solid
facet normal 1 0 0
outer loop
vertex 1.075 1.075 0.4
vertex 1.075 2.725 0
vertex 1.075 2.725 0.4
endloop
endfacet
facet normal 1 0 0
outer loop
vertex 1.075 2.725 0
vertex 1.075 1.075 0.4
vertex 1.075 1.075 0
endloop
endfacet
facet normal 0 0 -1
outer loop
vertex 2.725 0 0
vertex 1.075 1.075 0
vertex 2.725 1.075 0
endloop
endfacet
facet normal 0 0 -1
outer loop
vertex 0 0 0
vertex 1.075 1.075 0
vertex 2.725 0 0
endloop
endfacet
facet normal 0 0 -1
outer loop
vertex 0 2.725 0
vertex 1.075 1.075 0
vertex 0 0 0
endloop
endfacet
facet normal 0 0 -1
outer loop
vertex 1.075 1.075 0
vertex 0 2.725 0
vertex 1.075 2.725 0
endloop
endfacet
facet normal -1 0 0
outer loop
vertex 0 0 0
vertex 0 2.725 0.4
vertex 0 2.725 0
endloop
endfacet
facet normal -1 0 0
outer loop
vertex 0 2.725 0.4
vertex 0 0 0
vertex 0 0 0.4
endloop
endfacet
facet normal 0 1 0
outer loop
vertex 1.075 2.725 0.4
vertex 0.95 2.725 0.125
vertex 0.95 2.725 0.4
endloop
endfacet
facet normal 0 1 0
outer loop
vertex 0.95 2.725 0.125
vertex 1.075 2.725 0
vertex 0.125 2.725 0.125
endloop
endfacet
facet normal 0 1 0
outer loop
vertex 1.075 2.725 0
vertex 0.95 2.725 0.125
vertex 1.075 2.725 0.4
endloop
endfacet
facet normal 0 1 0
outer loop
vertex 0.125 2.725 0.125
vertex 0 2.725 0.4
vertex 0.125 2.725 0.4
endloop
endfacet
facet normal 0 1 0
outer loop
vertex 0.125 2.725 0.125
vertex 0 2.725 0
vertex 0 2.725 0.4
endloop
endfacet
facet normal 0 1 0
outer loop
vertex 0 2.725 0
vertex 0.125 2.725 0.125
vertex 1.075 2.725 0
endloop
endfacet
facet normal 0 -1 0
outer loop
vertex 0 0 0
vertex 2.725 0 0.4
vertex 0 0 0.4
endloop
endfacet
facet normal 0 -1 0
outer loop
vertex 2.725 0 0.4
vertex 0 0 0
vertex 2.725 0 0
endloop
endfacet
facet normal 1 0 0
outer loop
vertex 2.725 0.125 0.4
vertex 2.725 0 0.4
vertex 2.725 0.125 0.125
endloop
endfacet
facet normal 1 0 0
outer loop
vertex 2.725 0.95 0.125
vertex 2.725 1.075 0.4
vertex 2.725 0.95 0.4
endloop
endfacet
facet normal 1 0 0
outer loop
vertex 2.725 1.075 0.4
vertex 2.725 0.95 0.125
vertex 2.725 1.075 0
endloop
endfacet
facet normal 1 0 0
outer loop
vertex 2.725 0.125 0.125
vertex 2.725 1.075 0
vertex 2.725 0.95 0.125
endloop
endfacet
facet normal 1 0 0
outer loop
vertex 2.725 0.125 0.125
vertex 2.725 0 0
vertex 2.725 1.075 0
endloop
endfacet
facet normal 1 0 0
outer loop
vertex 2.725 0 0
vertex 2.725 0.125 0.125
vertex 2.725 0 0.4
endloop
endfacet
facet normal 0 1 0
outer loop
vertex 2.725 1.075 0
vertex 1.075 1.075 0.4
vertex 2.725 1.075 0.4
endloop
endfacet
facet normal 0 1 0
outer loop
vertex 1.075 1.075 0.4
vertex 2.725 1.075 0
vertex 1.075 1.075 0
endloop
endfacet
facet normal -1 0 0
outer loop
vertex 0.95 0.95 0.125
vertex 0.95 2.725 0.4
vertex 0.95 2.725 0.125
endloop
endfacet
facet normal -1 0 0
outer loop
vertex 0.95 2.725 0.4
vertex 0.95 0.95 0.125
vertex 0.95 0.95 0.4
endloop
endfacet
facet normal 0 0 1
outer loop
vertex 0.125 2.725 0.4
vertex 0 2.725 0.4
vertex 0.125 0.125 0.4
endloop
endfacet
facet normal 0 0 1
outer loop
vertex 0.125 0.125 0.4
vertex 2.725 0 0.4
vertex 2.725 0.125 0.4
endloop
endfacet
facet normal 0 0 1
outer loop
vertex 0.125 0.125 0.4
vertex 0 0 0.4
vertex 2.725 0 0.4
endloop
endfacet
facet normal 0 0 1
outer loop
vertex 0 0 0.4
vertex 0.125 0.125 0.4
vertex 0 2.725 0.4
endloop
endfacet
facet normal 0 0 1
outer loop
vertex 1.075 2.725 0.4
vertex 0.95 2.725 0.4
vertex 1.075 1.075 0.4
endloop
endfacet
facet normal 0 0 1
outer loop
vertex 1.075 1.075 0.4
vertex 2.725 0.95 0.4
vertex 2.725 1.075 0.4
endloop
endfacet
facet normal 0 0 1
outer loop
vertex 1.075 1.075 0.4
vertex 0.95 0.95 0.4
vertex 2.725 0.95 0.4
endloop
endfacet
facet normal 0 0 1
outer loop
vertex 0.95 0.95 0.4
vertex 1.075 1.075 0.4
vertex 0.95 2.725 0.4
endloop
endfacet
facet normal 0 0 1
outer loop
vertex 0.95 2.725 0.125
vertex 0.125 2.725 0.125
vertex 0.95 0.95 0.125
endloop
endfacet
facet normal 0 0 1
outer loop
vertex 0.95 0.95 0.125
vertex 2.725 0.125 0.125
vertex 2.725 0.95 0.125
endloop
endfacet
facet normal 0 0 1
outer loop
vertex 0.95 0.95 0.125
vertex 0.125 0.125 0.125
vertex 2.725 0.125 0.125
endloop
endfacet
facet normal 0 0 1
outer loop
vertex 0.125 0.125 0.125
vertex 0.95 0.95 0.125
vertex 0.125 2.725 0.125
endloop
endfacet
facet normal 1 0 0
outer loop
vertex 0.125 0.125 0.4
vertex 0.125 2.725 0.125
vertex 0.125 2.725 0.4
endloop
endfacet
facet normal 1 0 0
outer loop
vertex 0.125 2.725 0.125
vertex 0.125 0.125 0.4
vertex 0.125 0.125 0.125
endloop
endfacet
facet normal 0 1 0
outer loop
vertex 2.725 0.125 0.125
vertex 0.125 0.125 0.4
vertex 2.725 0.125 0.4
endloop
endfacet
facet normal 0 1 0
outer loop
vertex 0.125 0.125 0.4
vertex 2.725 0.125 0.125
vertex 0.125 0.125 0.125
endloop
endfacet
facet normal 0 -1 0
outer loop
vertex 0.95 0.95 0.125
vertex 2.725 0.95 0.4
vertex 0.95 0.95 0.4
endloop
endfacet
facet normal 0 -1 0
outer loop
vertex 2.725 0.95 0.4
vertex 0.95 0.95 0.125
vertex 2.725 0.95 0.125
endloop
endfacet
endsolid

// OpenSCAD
// Window screen corners

tolerance = 1.10;
frameWidth = 0.75 * tolerance;
frameDepth = 0.25 * tolerance;
thickness = 0.125;
//multiplier = 25.4;
multiplier = 1;
TWO_SIDED = false;
DRILL_HOLE = false;


ScreenCorner(
    frameWidth * multiplier,
    frameDepth * multiplier,
    thickness * multiplier,
    frameWidth * multiplier * 3
);

module ScreenCorner(frameWidth=3, frameDepth=1, thickness=1, socketLength=9, $fn=false) {
    center = $fn;

    totalDepth = 2 * thickness + frameDepth;
    totalWidth = 2 * thickness + frameWidth;
    totalHeight = 2 * thickness + socketLength;
    radius = thickness * 3;
    holeOffset = frameDepth * 2;

    difference() {
        union() {
            cube([totalWidth, totalHeight, totalDepth], center);
            cube([totalHeight, totalWidth, totalDepth], center);
        }
     
        translate([thickness, thickness, thickness]) {
            cube([frameWidth, totalHeight, frameDepth], center);    
        }
        translate([thickness, thickness, thickness]) {
            cube([totalHeight, frameWidth, frameDepth], center);
        }
        translate([
            TWO_SIDED ? thickness : 0,
            TWO_SIDED ? thickness : 0,
            TWO_SIDED ? totalDepth - 2*thickness : totalDepth - thickness
        ]) {
            cube([
                totalHeight,
                totalHeight,
                TWO_SIDED ? thickness : thickness * 2
            ], center); 
        }
        if (DRILL_HOLE) {
            translate([holeOffset, holeOffset, 0]) {
                cylinder(totalDepth, radius, radius, center, $fn=50);
            }
        }
    }
       
}
